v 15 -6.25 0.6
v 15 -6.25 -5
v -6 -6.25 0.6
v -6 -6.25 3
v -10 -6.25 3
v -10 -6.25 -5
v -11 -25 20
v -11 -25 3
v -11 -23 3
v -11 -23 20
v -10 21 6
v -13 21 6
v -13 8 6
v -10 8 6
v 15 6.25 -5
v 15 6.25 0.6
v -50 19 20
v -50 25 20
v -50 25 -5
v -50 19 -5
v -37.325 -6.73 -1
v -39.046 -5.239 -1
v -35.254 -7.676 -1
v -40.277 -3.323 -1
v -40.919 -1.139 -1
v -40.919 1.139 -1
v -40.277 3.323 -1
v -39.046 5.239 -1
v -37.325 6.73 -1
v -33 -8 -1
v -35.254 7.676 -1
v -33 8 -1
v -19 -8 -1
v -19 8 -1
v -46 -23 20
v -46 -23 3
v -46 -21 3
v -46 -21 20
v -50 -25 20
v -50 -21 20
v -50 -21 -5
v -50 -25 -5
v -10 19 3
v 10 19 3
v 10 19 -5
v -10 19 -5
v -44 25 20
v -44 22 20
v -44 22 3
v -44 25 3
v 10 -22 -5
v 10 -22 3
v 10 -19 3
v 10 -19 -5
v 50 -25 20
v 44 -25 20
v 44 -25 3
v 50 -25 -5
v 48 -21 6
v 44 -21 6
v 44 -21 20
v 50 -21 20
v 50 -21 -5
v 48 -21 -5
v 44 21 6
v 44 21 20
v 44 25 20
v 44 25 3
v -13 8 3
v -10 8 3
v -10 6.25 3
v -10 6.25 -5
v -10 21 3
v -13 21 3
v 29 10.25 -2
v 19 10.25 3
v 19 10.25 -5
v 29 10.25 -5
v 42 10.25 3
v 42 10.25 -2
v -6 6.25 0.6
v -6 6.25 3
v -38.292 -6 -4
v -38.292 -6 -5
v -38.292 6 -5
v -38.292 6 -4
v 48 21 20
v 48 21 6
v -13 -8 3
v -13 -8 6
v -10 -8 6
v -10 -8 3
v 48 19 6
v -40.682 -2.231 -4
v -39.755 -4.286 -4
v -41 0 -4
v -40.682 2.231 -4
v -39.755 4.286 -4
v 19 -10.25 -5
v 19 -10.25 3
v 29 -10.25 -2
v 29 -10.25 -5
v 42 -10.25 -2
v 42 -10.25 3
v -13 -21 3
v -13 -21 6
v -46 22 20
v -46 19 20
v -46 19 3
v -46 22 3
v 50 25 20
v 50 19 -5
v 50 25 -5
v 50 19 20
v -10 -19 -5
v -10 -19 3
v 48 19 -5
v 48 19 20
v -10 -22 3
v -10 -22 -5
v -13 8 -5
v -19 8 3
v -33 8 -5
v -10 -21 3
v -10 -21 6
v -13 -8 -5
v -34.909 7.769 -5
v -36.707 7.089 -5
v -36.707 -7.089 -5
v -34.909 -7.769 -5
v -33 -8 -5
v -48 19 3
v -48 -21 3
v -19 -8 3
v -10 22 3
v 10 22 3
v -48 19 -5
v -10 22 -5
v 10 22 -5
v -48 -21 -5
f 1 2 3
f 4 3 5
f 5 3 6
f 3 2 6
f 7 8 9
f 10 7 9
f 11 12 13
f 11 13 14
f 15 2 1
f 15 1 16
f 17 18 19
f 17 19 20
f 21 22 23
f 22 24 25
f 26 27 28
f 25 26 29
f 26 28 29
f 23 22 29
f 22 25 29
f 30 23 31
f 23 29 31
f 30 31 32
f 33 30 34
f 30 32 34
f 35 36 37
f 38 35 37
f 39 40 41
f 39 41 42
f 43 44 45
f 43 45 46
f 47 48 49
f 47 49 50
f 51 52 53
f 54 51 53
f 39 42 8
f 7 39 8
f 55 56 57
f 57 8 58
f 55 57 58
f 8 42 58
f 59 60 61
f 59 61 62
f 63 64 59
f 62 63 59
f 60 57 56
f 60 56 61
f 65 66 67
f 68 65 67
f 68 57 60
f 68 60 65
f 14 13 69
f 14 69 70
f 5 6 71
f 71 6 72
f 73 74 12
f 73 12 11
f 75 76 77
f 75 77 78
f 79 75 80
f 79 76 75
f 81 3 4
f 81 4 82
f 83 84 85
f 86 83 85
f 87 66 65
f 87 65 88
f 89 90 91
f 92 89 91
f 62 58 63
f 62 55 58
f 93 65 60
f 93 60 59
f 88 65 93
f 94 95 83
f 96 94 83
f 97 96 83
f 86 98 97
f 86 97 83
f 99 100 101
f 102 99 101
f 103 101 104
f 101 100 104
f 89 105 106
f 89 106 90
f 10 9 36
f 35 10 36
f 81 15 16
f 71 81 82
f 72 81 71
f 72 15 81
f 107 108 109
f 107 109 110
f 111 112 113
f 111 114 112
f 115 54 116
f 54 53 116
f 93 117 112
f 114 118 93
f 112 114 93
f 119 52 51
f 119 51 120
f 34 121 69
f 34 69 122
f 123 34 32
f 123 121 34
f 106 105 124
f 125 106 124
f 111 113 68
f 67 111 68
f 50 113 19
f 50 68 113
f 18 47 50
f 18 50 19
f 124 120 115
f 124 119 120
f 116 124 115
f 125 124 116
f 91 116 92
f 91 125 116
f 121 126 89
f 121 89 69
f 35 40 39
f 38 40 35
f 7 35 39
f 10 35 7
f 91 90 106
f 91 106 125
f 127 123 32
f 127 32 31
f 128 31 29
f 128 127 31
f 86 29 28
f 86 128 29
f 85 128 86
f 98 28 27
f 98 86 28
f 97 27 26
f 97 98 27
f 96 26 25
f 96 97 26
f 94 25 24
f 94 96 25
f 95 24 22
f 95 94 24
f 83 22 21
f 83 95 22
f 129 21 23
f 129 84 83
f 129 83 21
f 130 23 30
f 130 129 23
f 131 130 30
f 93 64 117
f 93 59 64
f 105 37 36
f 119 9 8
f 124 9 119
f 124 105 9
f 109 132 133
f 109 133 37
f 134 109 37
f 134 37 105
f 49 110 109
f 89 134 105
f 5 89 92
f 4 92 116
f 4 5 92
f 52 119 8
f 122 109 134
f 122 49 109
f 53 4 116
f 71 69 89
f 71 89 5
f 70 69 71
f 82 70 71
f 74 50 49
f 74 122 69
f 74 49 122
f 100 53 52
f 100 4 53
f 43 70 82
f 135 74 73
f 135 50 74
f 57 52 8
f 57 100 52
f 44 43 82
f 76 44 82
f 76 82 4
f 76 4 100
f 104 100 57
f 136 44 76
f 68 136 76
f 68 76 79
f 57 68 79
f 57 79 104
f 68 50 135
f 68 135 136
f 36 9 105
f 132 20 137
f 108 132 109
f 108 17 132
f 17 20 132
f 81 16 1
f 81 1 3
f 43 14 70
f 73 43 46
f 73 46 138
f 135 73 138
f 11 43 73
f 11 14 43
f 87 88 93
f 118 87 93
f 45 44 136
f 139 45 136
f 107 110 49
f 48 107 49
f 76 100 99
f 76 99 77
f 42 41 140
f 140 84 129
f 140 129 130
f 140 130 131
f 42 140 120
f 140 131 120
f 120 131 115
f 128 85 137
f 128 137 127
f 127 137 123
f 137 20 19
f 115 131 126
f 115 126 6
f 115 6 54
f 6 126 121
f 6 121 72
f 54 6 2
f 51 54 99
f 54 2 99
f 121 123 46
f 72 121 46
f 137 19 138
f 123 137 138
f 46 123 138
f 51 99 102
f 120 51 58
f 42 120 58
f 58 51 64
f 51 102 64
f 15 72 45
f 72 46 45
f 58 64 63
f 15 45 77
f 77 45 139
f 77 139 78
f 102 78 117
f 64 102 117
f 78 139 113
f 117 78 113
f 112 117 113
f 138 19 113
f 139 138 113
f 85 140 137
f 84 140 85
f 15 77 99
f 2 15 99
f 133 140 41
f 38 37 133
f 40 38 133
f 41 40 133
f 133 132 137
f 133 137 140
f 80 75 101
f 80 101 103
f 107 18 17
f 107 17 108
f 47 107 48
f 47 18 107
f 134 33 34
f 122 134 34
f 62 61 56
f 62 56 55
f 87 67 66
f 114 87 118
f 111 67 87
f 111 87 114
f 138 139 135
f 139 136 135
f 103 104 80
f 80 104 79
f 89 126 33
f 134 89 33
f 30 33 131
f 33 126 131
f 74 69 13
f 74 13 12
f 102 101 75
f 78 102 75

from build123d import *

# Parameters (mm, degrees)
SKIZZE1_W                            = 100
SKIZZE1_H                            = 50
SKIZZE1_W_2                          = 20
SKIZZE1_H_2                          = 3
AUFSATZ_LINEAR_AUSTRAGEN1_DEPTH      = 3
SKIZZE2_W                            = 90
SKIZZE2_H                            = 25
AUFSATZ_LINEAR_AUSTRAGEN2_DEPTH      = 5
SCHNITT_LINEAR_AUSTRAGEN1_DEPTH      = 4
SKIZZE4_W                            = 6
SKIZZE4_H                            = 16
SCHNITT_LINEAR_AUSTRAGEN2_DEPTH      = 5
SCHNITT_LINEAR_AUSTRAGEN2_DEPTH_BACK = 5
SKIZZE5_W                            = 25
SKIZZE5_H                            = 12.5
SCHNITT_LINEAR_AUSTRAGEN3_DEPTH      = 5.6
SKIZZE6_W                            = 4
SKIZZE6_H                            = 12.5
SCHNITT_LINEAR_AUSTRAGEN4_DEPTH      = 6.6
SCHNITT_LINEAR_AUSTRAGEN4_DEPTH_BACK = 3.4
SKIZZE8_W                            = 13
SKIZZE8_H                            = 20.5
SCHNITT_LINEAR_AUSTRAGEN5_DEPTH      = 5
SKIZZE9_W                            = 10
SKIZZE9_H                            = 20.5
SCHNITT_LINEAR_AUSTRAGEN6_DEPTH      = 8
AUFSATZ_LINEAR_AUSTRAGEN3_DEPTH      = 1
AUFSATZ_LINEAR_AUSTRAGEN4_DEPTH      = 17
SKIZZE14_W                           = 3
SKIZZE14_H                           = 42
AUFSATZ_LINEAR_AUSTRAGEN5_DEPTH      = 3
SKIZZE15_W                           = 3
SKIZZE15_H                           = 16
SCHNITT_LINEAR_AUSTRAGEN7_DEPTH      = 3
SKIZZE16_W                           = 2
SKIZZE16_H                           = 2
AUFSATZ_LINEAR_AUSTRAGEN6_DEPTH      = 17
SKIZZE17_W                           = 2
SKIZZE17_H                           = 40
SCHNITT_LINEAR_AUSTRAGEN8_DEPTH      = 20
SKIZZE18_W                           = 35
SKIZZE18_H                           = 2
SCHNITT_LINEAR_AUSTRAGEN9_DEPTH      = 17
SKIZZE19_W                           = 2
SKIZZE19_H                           = 6
SKIZZE19_W_2                         = 4
SKIZZE19_H_2                         = 4
AUFSATZ_LINEAR_AUSTRAGEN7_DEPTH      = 17
SKIZZE20_W                           = 1
SKIZZE20_H                           = 42
AUFSATZ_LINEAR_AUSTRAGEN8_DEPTH      = 3
SKIZZE21_W                           = 2
SKIZZE21_H                           = 3
AUFSATZ_LINEAR_AUSTRAGEN9_DEPTH      = 17
SKIZZE22_W                           = 20
SKIZZE22_H                           = 3
SKIZZE22_W_2                         = 90
SKIZZE22_H_2                         = 25
AUFSATZ_LINEAR_AUSTRAGEN10_DEPTH     = 5
SKIZZE24_W                           = 2
SKIZZE24_H                           = 4
AUFSATZ_LINEAR_AUSTRAGEN11_DEPTH     = 17


with BuildPart() as part:
    # Skizze1 → Aufsatz-Linear austragen1 (new body)
    with BuildSketch(Plane.XY):
        Rectangle(SKIZZE1_W, SKIZZE1_H)
        with Locations((0, -20.5)):
            Rectangle(SKIZZE1_W_2, SKIZZE1_H_2, mode=Mode.SUBTRACT)
        with Locations((0, 20.5)):
            Rectangle(SKIZZE1_W_2, SKIZZE1_H_2, mode=Mode.SUBTRACT)
    extrude(amount=AUFSATZ_LINEAR_AUSTRAGEN1_DEPTH)

    # Skizze2 → Aufsatz-Linear austragen2 (add)
    with BuildSketch(Plane(origin=(0, 0, 0), x_dir=(-1, 0, 0), z_dir=(0, 0, -1))):
        Rectangle(SKIZZE2_W, SKIZZE2_H)
    extrude(amount=AUFSATZ_LINEAR_AUSTRAGEN2_DEPTH)

    # Skizze3 → Schnitt-Linear austragen1 (cut)
    with BuildSketch(Plane(origin=(0, 0, -5), x_dir=(-1, 0, 0), z_dir=(0, 0, -1))):
        with BuildLine():
            Line((33, -8), (13, -8))
            Line((13, -8), (13, 8))
            Line((13, 8), (33, 8))
            ThreePointArc((33, 8), (41, 0), (33, -8))
        make_face()
    extrude(amount=-SCHNITT_LINEAR_AUSTRAGEN1_DEPTH, mode=Mode.SUBTRACT)

    # Skizze4 → Schnitt-Linear austragen2 (cut, two sides)
    with BuildSketch(Plane(origin=(0, 0, -1), x_dir=(-1, 0, 0), z_dir=(0, 0, -1))) as schnitt_linear_austragen2_sk:
        with Locations((16, 0)):
            Rectangle(SKIZZE4_W, SKIZZE4_H)
    extrude(amount=SCHNITT_LINEAR_AUSTRAGEN2_DEPTH, mode=Mode.SUBTRACT)
    extrude(schnitt_linear_austragen2_sk.sketch, amount=-SCHNITT_LINEAR_AUSTRAGEN2_DEPTH_BACK, mode=Mode.SUBTRACT)

    # Skizze5 → Schnitt-Linear austragen3 (cut)
    with BuildSketch(Plane(origin=(0, 0, -5), x_dir=(-1, 0, 0), z_dir=(0, 0, -1))):
        with Locations((-2.5, 0)):
            Rectangle(SKIZZE5_W, SKIZZE5_H)
    extrude(amount=-SCHNITT_LINEAR_AUSTRAGEN3_DEPTH, mode=Mode.SUBTRACT)

    # Skizze6 → Schnitt-Linear austragen4 (cut, two sides)
    with BuildSketch(Plane(origin=(0, 0, 0.6), x_dir=(-1, 0, 0), z_dir=(0, 0, -1))) as schnitt_linear_austragen4_sk:
        with Locations((8, 0)):
            Rectangle(SKIZZE6_W, SKIZZE6_H)
    extrude(amount=SCHNITT_LINEAR_AUSTRAGEN4_DEPTH, mode=Mode.SUBTRACT)
    extrude(schnitt_linear_austragen4_sk.sketch, amount=-SCHNITT_LINEAR_AUSTRAGEN4_DEPTH_BACK, mode=Mode.SUBTRACT)

    # Skizze8 → Schnitt-Linear austragen5 (cut)
    with BuildSketch(Plane.XY.offset(3)):
        with Locations((35.5, 0)):
            Rectangle(SKIZZE8_W, SKIZZE8_H)
    extrude(amount=-SCHNITT_LINEAR_AUSTRAGEN5_DEPTH, mode=Mode.SUBTRACT)

    # Skizze9 → Schnitt-Linear austragen6 (cut)
    with BuildSketch(Plane.XY.offset(3)):
        with Locations((24, 0)):
            Rectangle(SKIZZE9_W, SKIZZE9_H)
    extrude(amount=-SCHNITT_LINEAR_AUSTRAGEN6_DEPTH, mode=Mode.SUBTRACT)

    # Skizze10 → Aufsatz-Linear austragen3 (add)
    with BuildSketch(Plane(origin=(0, 0, -5), x_dir=(-1, 0, 0), z_dir=(0, 0, -1))):
        with BuildLine():
            Line((38.291502622, -6), (38.291502622, 6))
            ThreePointArc((38.291502622, 6), (41, 0), (38.291502622, -6))
        make_face()
    extrude(amount=-AUFSATZ_LINEAR_AUSTRAGEN3_DEPTH)

    # Skizze11 → Aufsatz-Linear austragen4 (add)
    with BuildSketch(Plane.XY.offset(3)):
        Polygon((-50, 25), (-50, -25), (-48, -25), (-11, -25), (-11, -23), (-48, -23), (-48, 25), align=None)
        Polygon((50, -25), (50, 25), (48, 25), (48, -23), (11, -23), (11, -25), align=None)
    extrude(amount=AUFSATZ_LINEAR_AUSTRAGEN4_DEPTH)

    # Skizze14 → Aufsatz-Linear austragen5 (add)
    with BuildSketch(Plane.XY.offset(3)):
        with Locations((-11.5, 0)):
            Rectangle(SKIZZE14_W, SKIZZE14_H)
        with Locations((45.5, 0)):
            Rectangle(SKIZZE14_W, SKIZZE14_H)
    extrude(amount=AUFSATZ_LINEAR_AUSTRAGEN5_DEPTH)

    # Skizze15 → Schnitt-Linear austragen7 (cut)
    with BuildSketch(Plane.XY.offset(6)):
        with Locations((-11.5, 0)):
            Rectangle(SKIZZE15_W, SKIZZE15_H)
    extrude(amount=-SCHNITT_LINEAR_AUSTRAGEN7_DEPTH, mode=Mode.SUBTRACT)

    # Skizze16 → Aufsatz-Linear austragen6 (add)
    with BuildSketch(Plane.XY.offset(3)):
        with Locations((-47, -22)):
            Rectangle(SKIZZE16_W, SKIZZE16_H)
        with Locations((47, -22)):
            Rectangle(SKIZZE16_W, SKIZZE16_H)
    extrude(amount=AUFSATZ_LINEAR_AUSTRAGEN6_DEPTH)

    # Skizze17 → Schnitt-Linear austragen8 (cut)
    with BuildSketch(Plane.XY.offset(20)):
        with Locations((-49, -1)):
            Rectangle(SKIZZE17_W, SKIZZE17_H)
        with Locations((49, -1)):
            Rectangle(SKIZZE17_W, SKIZZE17_H)
    extrude(amount=-SCHNITT_LINEAR_AUSTRAGEN8_DEPTH, mode=Mode.SUBTRACT)

    # Skizze18 → Schnitt-Linear austragen9 (cut)
    with BuildSketch(Plane.XY.offset(20)):
        with Locations((28.5, -24)):
            Rectangle(SKIZZE18_W, SKIZZE18_H)
    extrude(amount=-SCHNITT_LINEAR_AUSTRAGEN9_DEPTH, mode=Mode.SUBTRACT)

    # Skizze19 → Aufsatz-Linear austragen7 (add)
    with BuildSketch(Plane.XY.offset(3)):
        with Locations((-47, 22)):
            Rectangle(SKIZZE19_W, SKIZZE19_H)
        with Locations((46, 23)):
            Rectangle(SKIZZE19_W_2, SKIZZE19_H_2)
    extrude(amount=AUFSATZ_LINEAR_AUSTRAGEN7_DEPTH)

    # Skizze20 → Aufsatz-Linear austragen8 (add)
    with BuildSketch(Plane.XY.offset(3)):
        with Locations((47.5, 0)):
            Rectangle(SKIZZE20_W, SKIZZE20_H)
    extrude(amount=AUFSATZ_LINEAR_AUSTRAGEN8_DEPTH)

    # Skizze21 → Aufsatz-Linear austragen9 (add)
    with BuildSketch(Plane.XY.offset(3)):
        with Locations((-45, 23.5)):
            Rectangle(SKIZZE21_W, SKIZZE21_H)
    extrude(amount=AUFSATZ_LINEAR_AUSTRAGEN9_DEPTH)

    # Skizze22 → Aufsatz-Linear austragen10 (add)
    with BuildSketch(Plane(origin=(0, 0, 0), x_dir=(-1, 0, 0), z_dir=(0, 0, -1))):
        Polygon((-50, 19), (-50, 25), (50, 25), (50, 19), (48, 19), (48, -21), (50, -21), (50, -25), (-50, -25), (-50, -21), (-48, -21), (-48, 19), align=None)
        with Locations((0, 20.5)):
            Rectangle(SKIZZE22_W, SKIZZE22_H, mode=Mode.SUBTRACT)
        Rectangle(SKIZZE22_W_2, SKIZZE22_H_2, mode=Mode.SUBTRACT)
        with Locations((0, -20.5)):
            Rectangle(SKIZZE22_W, SKIZZE22_H, mode=Mode.SUBTRACT)
    extrude(amount=AUFSATZ_LINEAR_AUSTRAGEN10_DEPTH)

    # Skizze24 → Aufsatz-Linear austragen11 (add)
    with BuildSketch(Plane.XY.offset(3)):
        with Locations((45, -23)):
            Rectangle(SKIZZE24_W, SKIZZE24_H)
    extrude(amount=AUFSATZ_LINEAR_AUSTRAGEN11_DEPTH)


solid = part.part
